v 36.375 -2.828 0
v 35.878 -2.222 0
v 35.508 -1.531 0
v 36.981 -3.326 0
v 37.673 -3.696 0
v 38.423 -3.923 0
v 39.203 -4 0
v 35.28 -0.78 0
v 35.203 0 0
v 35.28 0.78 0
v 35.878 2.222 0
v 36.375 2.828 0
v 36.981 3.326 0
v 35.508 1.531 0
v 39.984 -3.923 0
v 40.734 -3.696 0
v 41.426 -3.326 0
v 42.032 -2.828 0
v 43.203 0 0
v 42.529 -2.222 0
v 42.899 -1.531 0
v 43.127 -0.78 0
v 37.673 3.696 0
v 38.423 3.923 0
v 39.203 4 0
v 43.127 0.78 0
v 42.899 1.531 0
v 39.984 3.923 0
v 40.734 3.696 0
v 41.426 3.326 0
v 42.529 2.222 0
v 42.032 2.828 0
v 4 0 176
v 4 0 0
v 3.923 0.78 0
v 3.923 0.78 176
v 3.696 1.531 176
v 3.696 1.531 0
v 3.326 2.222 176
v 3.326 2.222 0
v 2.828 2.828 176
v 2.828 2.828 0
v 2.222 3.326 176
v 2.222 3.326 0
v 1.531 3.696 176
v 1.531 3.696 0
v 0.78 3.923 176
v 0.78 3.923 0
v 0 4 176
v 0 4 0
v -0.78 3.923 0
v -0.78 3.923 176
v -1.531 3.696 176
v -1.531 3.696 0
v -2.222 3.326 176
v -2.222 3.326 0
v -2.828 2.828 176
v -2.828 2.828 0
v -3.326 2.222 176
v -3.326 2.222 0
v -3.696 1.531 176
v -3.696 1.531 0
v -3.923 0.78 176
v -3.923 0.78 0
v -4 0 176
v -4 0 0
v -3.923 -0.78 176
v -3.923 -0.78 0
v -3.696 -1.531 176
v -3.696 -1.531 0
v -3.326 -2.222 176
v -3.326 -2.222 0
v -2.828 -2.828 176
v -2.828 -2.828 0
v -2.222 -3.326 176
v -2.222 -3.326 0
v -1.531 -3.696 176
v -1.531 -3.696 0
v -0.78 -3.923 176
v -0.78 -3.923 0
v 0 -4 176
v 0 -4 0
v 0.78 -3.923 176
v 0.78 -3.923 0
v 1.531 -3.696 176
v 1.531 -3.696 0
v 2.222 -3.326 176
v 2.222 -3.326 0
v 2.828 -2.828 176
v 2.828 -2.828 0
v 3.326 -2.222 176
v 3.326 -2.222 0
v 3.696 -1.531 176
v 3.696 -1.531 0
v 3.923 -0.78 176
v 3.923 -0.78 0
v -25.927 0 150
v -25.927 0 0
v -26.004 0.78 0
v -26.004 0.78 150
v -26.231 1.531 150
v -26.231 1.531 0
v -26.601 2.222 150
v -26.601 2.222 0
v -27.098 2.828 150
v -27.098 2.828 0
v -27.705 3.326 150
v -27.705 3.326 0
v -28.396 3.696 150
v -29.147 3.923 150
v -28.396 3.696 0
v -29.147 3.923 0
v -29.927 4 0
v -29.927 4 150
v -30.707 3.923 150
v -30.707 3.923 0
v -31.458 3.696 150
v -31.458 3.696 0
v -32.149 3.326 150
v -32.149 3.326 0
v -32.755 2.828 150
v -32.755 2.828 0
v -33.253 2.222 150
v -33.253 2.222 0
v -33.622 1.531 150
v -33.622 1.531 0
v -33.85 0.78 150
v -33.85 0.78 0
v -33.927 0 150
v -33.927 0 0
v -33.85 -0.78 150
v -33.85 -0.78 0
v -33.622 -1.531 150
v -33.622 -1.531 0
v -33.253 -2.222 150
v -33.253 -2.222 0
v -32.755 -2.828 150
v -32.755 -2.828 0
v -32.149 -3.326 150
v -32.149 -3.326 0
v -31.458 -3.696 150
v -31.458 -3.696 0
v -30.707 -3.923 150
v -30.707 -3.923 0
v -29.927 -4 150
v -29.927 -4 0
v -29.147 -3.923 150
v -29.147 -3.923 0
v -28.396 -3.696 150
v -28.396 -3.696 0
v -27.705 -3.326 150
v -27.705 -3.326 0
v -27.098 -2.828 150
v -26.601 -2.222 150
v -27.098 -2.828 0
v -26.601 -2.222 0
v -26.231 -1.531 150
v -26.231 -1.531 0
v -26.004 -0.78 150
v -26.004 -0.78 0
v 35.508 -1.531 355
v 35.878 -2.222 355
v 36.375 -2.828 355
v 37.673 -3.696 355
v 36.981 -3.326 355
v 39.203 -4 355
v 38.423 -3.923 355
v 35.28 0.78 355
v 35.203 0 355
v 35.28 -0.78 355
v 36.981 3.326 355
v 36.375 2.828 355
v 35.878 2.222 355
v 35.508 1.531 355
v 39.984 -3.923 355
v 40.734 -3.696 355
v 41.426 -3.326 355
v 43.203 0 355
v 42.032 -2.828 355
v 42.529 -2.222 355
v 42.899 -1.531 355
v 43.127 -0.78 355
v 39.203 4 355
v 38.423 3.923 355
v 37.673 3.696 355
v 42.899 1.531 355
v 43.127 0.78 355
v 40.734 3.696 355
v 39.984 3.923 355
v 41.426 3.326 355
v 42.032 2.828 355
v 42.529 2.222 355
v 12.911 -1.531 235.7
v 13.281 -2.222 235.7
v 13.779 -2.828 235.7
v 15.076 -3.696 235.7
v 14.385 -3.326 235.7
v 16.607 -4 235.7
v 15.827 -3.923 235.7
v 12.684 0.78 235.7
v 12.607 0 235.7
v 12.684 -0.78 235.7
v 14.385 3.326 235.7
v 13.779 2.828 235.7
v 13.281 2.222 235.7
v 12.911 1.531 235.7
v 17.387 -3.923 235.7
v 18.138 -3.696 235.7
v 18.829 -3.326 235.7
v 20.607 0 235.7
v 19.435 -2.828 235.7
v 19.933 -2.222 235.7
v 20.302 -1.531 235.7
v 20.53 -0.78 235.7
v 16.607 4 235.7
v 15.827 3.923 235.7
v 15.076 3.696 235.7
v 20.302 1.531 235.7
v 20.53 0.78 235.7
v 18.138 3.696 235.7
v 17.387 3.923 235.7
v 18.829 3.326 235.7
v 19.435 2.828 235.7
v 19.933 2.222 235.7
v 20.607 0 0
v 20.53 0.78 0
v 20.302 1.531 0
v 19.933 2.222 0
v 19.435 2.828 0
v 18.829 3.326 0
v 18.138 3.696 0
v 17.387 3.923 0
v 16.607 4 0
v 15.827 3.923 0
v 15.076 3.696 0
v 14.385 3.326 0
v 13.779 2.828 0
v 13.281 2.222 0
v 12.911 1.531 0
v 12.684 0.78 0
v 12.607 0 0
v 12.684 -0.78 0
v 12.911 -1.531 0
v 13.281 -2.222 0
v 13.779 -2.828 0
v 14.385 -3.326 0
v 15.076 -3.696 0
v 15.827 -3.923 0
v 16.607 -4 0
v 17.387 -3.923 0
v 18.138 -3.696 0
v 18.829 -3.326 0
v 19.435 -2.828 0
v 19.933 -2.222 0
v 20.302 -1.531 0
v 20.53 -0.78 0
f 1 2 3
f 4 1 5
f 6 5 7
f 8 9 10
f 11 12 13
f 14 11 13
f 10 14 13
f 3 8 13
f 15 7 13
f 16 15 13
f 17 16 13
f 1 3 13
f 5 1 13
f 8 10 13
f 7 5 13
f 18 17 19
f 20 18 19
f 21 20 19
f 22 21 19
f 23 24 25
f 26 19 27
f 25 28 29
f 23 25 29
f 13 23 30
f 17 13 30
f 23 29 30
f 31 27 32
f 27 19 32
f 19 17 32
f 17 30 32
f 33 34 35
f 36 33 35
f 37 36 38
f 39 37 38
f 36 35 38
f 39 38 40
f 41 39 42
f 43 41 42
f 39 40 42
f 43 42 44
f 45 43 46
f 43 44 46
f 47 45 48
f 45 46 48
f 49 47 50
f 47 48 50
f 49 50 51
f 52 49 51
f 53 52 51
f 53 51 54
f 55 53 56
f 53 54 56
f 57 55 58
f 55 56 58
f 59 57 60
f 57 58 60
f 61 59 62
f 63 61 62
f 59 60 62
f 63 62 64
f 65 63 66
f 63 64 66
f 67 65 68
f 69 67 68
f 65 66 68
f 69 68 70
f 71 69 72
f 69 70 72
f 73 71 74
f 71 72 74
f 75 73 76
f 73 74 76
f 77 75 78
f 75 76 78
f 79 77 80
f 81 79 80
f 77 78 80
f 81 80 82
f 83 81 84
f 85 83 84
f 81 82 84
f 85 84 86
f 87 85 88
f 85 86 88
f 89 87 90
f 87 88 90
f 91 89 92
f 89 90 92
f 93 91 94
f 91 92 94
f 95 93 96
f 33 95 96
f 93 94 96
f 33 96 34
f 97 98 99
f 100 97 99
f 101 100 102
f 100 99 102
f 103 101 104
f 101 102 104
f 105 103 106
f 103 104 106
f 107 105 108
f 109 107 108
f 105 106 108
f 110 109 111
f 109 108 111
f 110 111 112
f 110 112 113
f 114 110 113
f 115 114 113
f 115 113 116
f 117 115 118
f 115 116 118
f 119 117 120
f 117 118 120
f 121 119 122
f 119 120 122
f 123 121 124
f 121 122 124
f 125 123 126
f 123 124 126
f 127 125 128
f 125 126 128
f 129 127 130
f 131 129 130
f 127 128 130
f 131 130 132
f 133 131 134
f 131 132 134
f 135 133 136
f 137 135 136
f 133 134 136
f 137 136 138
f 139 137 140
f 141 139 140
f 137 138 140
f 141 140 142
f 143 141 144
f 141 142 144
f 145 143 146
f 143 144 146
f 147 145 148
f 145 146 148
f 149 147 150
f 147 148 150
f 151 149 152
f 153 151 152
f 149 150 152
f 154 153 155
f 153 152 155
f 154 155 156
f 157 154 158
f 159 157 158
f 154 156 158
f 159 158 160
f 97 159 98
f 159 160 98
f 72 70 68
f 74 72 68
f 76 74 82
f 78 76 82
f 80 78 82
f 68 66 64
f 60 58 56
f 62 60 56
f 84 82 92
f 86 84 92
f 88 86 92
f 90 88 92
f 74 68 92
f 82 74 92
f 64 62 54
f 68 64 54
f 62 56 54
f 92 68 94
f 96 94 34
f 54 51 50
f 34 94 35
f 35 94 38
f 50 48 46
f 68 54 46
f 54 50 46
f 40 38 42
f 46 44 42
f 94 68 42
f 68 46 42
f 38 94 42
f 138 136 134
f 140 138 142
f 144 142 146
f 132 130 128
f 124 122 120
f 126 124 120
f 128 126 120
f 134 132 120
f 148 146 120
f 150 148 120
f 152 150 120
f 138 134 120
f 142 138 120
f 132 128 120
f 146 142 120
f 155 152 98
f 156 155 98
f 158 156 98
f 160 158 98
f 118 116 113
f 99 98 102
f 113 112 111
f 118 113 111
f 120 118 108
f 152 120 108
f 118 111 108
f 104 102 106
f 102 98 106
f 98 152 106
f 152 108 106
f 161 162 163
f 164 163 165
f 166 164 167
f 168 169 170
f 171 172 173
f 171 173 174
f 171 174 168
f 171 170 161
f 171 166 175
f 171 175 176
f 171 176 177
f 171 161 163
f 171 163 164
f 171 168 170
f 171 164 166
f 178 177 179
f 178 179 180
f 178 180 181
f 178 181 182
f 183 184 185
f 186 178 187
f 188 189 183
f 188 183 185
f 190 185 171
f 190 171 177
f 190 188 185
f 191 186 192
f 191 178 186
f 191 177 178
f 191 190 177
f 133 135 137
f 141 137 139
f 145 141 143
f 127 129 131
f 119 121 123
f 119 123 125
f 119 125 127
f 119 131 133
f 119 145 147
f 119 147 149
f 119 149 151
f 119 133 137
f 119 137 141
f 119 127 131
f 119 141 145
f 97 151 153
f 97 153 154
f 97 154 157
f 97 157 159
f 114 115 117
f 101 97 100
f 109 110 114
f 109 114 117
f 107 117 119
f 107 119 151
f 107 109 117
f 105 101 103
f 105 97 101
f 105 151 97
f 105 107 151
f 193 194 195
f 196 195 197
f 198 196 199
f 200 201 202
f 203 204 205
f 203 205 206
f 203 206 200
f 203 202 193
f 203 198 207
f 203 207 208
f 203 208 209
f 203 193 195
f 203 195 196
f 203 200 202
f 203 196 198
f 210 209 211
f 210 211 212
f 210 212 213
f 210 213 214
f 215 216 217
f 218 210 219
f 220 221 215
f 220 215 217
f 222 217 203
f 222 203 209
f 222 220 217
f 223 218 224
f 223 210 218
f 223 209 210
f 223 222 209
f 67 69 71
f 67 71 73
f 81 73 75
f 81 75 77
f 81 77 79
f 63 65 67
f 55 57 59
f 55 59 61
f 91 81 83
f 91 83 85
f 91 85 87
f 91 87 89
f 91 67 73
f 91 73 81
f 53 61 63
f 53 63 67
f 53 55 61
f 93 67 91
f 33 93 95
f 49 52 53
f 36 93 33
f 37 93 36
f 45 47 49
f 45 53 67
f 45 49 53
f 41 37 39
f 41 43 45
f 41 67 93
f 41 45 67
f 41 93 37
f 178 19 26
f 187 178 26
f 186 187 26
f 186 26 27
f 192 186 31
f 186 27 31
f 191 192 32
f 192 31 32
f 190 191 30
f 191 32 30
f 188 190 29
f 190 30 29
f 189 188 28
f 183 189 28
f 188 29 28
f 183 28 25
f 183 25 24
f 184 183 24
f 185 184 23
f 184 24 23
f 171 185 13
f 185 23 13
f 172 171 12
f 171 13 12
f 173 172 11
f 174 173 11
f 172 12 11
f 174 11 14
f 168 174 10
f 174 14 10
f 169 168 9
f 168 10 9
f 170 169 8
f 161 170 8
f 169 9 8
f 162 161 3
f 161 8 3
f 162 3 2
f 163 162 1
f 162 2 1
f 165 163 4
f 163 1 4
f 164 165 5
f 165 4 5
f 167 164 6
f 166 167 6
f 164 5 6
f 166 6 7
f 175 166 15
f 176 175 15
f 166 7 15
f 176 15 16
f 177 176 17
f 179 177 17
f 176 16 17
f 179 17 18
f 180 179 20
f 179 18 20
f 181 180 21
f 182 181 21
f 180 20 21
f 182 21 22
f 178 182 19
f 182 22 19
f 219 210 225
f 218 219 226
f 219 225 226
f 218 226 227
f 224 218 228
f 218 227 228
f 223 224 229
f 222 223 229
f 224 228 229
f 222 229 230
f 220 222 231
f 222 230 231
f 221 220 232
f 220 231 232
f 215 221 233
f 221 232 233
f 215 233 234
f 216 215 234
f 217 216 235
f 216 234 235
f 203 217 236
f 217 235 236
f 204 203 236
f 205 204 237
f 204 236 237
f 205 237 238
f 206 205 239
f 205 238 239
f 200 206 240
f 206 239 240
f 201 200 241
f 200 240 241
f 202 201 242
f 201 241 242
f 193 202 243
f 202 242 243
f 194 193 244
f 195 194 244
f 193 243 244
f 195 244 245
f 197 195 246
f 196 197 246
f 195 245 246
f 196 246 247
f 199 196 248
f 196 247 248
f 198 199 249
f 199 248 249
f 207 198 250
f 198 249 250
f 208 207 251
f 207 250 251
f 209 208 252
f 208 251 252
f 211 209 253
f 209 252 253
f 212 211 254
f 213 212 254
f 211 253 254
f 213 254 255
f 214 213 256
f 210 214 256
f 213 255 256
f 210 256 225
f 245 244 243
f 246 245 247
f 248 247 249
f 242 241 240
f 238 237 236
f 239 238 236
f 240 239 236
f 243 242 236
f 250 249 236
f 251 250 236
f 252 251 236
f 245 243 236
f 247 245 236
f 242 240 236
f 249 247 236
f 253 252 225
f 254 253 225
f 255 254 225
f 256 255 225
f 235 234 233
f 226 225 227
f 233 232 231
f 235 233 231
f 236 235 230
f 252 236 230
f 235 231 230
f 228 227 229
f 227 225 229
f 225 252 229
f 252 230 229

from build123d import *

# Parameters (mm, degrees)
F0_R     = 4
F1_DEPTH = 176
F2_DEPTH = 235.7
F3_DEPTH = 355
F4_R     = 4
F5_DEPTH = 150


with BuildPart() as f1:
    # F0 (on Top) → F1 (new body)
    with BuildSketch(Plane.XY):
        Circle(F0_R)
    extrude(amount=F1_DEPTH)


with BuildPart() as f2:
    # F0 (on Top) → F2 (new body)
    with BuildSketch(Plane.XY):
        with Locations((16.606946, 0)):
            Circle(F0_R)
    extrude(amount=F2_DEPTH)


with BuildPart() as f3:
    # F0 (on Top) → F3 (new body)
    with BuildSketch(Plane.XY):
        with Locations((39.203439, 0)):
            Circle(F0_R)
    extrude(amount=F3_DEPTH)


with BuildPart() as f5:
    # F4 (on Top) → F5 (new body)
    with BuildSketch(Plane.XY):
        with Locations((-29.926899, 0)):
            Circle(F4_R)
    extrude(amount=F5_DEPTH)


solid = Compound([f1.part, f2.part, f3.part, f5.part])
